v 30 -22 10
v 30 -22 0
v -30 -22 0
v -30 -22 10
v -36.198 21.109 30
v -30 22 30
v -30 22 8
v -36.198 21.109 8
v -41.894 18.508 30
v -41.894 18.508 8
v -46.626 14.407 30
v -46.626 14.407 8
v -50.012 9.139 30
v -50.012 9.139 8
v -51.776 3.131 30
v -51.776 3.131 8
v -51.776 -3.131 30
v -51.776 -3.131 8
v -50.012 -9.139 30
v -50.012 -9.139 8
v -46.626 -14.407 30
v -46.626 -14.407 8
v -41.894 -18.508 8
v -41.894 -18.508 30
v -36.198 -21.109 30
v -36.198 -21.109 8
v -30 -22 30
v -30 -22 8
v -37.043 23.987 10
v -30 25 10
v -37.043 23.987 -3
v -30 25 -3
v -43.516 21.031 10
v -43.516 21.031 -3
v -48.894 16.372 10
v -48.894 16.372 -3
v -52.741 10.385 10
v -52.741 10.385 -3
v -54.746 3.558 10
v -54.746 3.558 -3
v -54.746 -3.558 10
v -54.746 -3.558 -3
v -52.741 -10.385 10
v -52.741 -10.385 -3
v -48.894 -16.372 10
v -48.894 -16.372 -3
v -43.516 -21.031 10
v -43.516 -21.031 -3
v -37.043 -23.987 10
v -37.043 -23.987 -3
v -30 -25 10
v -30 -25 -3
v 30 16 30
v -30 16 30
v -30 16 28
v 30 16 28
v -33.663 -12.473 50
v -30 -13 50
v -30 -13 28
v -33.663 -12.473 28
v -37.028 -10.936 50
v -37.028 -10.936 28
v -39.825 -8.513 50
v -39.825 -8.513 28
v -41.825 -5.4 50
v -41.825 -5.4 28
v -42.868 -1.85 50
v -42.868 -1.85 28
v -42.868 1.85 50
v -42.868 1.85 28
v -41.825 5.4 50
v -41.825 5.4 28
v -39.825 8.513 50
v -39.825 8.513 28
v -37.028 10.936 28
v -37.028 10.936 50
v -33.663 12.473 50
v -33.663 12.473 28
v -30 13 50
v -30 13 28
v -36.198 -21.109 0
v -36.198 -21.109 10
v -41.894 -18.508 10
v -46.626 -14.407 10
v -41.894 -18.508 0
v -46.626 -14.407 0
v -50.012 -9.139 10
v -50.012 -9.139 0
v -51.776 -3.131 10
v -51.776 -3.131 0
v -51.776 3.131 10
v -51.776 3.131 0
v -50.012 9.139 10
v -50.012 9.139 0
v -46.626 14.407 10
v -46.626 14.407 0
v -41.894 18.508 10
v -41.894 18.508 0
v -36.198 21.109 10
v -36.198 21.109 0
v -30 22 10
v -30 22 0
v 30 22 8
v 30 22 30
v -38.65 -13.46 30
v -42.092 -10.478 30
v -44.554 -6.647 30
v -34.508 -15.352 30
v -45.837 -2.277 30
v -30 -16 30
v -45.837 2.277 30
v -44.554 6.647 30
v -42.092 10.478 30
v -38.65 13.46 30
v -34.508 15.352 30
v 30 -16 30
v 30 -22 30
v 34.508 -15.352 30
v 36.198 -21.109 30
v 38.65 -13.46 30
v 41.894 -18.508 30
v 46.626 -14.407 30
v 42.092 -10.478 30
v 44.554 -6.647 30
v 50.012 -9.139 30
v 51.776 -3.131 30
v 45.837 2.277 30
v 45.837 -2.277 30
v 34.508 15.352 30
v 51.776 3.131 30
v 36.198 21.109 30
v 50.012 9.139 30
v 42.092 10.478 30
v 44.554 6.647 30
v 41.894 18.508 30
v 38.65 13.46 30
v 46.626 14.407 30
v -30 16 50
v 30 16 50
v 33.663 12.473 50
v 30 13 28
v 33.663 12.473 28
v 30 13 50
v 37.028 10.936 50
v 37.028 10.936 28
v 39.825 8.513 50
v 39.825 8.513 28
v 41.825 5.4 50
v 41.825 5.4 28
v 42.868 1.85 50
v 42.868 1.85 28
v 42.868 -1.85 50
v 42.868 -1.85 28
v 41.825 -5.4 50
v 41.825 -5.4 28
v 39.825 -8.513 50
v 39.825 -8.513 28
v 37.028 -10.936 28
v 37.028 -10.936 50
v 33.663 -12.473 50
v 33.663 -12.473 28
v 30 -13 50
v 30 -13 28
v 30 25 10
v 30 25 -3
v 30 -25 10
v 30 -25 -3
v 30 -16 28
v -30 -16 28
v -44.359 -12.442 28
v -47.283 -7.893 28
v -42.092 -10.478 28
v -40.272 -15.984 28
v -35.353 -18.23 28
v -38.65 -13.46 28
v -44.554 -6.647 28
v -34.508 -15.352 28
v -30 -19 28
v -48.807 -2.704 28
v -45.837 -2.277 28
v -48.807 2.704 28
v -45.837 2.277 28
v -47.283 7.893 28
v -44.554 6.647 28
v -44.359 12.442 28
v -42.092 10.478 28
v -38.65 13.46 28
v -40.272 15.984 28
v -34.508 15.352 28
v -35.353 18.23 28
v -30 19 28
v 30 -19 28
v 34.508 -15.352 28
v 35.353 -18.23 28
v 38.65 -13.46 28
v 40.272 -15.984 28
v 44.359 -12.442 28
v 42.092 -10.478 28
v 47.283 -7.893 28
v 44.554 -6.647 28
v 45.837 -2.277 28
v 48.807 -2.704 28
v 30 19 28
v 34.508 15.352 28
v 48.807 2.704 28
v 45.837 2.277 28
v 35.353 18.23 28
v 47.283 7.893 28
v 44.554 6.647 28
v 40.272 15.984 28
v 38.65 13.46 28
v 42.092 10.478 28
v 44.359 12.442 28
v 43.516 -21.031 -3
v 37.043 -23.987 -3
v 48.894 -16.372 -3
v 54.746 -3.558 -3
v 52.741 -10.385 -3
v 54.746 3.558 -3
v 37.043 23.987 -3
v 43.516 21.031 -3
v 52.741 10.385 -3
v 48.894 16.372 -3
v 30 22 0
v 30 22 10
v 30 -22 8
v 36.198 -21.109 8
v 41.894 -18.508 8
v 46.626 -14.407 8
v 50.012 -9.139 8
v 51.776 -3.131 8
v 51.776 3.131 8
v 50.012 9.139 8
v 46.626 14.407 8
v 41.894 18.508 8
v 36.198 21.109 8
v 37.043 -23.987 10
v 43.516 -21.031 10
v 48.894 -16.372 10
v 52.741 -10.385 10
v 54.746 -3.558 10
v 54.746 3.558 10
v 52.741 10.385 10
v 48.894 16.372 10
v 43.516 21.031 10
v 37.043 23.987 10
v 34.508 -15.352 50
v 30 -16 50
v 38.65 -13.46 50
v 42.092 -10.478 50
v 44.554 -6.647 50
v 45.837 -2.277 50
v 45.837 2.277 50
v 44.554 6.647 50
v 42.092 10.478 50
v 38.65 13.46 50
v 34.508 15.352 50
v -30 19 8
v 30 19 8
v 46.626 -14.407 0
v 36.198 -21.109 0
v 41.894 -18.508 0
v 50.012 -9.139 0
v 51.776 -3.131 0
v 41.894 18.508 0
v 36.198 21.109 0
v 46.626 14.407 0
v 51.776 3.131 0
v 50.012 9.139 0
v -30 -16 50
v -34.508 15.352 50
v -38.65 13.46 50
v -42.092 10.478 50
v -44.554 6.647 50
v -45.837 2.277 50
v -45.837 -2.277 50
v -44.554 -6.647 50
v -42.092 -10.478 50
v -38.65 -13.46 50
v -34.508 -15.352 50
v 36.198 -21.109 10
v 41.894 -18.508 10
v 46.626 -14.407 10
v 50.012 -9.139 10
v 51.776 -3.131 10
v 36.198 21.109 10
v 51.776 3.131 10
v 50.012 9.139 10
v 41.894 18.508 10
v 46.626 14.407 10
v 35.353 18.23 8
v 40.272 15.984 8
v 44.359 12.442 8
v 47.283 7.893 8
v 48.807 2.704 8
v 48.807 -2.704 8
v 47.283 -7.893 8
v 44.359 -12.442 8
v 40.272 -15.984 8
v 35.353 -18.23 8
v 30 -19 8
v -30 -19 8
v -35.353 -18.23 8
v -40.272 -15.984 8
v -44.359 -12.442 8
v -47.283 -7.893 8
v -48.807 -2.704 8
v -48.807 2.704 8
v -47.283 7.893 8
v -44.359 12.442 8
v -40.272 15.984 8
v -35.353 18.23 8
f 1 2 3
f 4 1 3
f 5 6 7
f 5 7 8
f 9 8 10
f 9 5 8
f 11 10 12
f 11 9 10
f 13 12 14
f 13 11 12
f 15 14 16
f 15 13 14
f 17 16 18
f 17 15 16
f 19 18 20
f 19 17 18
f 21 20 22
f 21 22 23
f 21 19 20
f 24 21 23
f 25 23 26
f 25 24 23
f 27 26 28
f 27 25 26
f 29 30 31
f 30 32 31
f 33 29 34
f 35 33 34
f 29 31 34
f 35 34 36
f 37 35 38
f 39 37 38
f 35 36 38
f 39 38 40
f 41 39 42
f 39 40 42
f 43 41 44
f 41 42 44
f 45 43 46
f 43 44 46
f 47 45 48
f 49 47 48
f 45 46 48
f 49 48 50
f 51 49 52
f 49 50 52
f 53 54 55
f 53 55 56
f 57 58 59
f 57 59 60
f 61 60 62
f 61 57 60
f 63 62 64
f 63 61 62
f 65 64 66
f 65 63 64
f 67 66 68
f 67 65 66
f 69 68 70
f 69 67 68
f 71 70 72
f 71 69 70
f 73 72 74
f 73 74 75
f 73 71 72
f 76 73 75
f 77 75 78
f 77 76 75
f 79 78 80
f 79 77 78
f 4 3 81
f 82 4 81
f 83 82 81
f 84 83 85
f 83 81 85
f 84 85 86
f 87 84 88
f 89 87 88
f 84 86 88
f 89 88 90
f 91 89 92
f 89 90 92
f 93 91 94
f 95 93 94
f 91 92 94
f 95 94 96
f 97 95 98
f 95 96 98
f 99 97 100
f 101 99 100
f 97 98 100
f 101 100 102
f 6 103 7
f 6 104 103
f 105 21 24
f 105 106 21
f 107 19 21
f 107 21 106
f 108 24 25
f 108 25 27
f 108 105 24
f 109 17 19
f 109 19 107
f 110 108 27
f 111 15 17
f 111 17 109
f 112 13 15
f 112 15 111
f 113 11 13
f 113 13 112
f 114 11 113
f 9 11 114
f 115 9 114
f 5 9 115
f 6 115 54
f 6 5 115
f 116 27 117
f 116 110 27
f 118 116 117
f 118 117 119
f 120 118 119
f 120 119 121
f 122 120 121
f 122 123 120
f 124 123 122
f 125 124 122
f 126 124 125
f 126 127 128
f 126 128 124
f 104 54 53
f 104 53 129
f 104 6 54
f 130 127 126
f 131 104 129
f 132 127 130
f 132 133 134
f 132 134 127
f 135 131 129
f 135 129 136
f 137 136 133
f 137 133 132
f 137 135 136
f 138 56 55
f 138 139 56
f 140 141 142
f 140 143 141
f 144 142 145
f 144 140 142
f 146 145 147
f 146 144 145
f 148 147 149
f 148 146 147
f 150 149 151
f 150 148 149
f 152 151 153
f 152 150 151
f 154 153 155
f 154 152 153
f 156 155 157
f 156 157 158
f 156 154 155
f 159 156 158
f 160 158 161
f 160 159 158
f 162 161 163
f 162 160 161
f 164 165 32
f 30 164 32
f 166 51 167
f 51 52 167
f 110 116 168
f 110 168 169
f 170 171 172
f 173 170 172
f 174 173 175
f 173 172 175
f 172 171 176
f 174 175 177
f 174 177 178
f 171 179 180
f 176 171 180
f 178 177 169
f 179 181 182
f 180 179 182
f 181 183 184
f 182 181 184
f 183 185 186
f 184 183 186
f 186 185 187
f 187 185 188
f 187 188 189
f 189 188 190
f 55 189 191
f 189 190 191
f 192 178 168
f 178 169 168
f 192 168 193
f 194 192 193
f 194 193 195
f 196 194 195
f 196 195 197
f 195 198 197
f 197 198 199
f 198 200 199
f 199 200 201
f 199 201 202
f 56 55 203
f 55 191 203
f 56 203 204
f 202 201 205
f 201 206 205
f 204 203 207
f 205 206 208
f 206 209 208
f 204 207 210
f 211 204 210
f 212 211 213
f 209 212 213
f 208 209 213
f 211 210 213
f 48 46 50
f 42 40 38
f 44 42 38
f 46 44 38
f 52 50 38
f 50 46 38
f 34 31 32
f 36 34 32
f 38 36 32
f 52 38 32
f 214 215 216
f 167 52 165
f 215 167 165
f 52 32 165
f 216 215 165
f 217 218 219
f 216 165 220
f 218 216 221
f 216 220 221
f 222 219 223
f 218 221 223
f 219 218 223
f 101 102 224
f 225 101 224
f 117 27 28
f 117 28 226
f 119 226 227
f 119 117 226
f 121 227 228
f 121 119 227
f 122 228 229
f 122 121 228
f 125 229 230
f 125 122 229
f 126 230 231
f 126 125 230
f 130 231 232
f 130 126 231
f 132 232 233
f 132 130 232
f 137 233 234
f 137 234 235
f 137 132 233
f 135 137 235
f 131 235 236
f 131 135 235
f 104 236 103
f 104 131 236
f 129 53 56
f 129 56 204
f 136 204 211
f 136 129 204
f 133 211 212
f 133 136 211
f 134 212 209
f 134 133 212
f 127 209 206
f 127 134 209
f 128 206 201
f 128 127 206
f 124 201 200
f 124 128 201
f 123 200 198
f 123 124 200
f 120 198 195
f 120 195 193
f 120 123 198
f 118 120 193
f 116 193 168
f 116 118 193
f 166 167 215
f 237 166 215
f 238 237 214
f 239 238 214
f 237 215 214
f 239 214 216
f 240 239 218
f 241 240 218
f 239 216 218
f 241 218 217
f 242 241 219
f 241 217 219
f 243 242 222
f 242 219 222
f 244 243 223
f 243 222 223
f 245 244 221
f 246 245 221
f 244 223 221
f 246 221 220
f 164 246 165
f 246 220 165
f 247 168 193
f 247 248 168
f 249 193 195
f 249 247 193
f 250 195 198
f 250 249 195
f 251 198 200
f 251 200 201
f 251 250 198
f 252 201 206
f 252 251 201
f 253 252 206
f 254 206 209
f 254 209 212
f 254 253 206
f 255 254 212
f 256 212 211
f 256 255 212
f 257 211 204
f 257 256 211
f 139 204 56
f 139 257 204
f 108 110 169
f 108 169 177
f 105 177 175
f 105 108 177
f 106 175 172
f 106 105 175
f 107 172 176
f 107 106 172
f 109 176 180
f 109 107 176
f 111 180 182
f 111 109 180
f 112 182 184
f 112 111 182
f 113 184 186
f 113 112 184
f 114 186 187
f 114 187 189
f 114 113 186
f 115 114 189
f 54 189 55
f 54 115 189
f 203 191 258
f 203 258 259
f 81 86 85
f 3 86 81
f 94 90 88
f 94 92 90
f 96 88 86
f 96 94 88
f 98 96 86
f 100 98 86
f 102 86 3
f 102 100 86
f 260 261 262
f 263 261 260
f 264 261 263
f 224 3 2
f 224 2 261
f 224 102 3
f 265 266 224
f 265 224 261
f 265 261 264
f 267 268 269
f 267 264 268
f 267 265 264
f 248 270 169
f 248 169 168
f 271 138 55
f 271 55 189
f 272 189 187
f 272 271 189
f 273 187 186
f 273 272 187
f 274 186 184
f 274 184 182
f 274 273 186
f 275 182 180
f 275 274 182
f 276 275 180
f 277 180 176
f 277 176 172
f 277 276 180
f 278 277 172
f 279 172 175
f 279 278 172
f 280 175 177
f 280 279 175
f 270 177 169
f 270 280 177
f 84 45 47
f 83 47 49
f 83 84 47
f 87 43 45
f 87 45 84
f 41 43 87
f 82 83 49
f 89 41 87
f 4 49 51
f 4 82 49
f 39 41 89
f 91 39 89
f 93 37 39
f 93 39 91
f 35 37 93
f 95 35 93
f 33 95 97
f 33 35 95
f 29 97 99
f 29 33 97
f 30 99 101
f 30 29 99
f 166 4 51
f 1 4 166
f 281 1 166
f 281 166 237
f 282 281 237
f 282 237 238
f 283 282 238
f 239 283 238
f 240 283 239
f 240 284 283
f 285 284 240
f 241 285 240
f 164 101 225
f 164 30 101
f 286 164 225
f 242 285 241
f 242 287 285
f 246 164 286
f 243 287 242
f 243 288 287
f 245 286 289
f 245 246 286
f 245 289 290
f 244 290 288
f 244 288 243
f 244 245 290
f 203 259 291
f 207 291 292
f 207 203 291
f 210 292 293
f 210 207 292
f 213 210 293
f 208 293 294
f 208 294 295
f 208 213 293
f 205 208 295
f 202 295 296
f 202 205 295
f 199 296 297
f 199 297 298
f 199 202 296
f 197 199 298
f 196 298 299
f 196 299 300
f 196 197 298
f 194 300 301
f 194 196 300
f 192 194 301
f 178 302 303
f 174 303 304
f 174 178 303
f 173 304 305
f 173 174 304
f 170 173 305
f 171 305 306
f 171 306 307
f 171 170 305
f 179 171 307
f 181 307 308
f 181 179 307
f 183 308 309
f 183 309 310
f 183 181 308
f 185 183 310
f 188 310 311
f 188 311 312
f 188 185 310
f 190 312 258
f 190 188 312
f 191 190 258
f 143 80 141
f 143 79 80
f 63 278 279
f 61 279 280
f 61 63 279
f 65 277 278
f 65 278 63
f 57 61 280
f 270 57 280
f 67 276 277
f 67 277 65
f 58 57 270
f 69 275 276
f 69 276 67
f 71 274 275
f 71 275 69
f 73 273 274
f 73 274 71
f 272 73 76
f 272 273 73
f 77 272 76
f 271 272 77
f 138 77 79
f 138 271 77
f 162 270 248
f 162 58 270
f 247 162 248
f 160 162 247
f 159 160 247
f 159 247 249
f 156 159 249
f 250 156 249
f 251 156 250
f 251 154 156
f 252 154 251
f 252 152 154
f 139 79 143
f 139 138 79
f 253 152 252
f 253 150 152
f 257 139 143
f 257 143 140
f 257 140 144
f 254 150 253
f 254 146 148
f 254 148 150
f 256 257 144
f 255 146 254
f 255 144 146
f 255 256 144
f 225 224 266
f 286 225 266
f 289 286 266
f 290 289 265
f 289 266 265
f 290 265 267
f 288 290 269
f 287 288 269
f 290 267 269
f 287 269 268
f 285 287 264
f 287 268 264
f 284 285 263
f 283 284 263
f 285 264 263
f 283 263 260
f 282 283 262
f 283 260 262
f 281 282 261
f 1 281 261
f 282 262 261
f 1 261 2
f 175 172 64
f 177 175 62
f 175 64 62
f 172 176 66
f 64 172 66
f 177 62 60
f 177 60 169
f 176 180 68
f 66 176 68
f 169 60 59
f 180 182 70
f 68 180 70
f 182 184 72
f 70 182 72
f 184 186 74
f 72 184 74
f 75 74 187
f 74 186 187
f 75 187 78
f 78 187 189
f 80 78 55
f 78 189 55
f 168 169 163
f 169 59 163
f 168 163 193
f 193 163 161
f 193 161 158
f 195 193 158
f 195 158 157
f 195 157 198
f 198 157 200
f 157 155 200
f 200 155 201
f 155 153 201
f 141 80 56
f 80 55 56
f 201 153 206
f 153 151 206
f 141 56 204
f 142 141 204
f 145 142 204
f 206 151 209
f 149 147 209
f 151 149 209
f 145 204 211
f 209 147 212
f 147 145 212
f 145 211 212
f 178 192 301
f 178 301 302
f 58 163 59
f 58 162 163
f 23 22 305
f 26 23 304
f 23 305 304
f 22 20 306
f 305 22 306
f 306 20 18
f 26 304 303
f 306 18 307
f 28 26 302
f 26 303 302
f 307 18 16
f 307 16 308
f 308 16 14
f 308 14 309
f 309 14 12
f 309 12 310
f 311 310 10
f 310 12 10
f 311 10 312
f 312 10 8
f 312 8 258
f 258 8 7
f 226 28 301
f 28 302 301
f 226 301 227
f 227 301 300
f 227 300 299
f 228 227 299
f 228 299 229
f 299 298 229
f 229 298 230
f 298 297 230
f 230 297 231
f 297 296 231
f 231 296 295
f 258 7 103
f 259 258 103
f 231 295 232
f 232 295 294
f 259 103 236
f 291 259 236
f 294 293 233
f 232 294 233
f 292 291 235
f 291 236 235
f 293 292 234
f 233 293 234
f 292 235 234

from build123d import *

# Parameters (mm, degrees)
F1_DEPTH      = 3
F2_DEPTH      = 10
F4_DEPTH      = 20
F4_DEPTH_BACK = 2
F6_DEPTH      = 20
F6_DEPTH_BACK = 2
F7_DEPTH      = 2


with BuildPart() as f1:
    # F0 (on Top) → F1 (new body)
    with BuildSketch(Plane.XY):
        with BuildLine():
            Line((30, 25), (-30, 25))
            ThreePointArc((-30, 25), (-55, 0), (-30, -25))
            Line((-30, -25), (30, -25))
            ThreePointArc((30, -25), (55, 0), (30, 25))
        make_face()
        with BuildLine():
            ThreePointArc((-30, -22.0000010729), (-52.0000010729, 0), (-30, 22.0000010729))
            Line((-30, 22.0000010729), (30, 22.0000010729))
            ThreePointArc((30, 22.0000010729), (52.0000010729, 0), (30, -22.0000010729))
            Line((30, -22.0000010729), (-30, -22.0000010729))
        make_face(mode=Mode.SUBTRACT)
        with BuildLine():
            Line((30, 22.0000010729), (-30, 22.0000010729))
            ThreePointArc((-30, 22.0000010729), (-52.0000010729, 0), (-30, -22.0000010729))
            Line((-30, -22.0000010729), (30, -22.0000010729))
            ThreePointArc((30, -22.0000010729), (52.0000010729, 0), (30, 22.0000010729))
        make_face()
    extrude(amount=-F1_DEPTH)

    # F0 (on Top) → F2 (join)
    with BuildSketch(Plane.XY):
        with BuildLine():
            Line((30, 25), (-30, 25))
            ThreePointArc((-30, 25), (-55, 0), (-30, -25))
            Line((-30, -25), (30, -25))
            ThreePointArc((30, -25), (55, 0), (30, 25))
        make_face()
        with BuildLine():
            ThreePointArc((-30, -22.0000010729), (-52.0000010729, 0), (-30, 22.0000010729))
            Line((-30, 22.0000010729), (30, 22.0000010729))
            ThreePointArc((30, 22.0000010729), (52.0000010729, 0), (30, -22.0000010729))
            Line((30, -22.0000010729), (-30, -22.0000010729))
        make_face(mode=Mode.SUBTRACT)
    extrude(amount=F2_DEPTH)


with BuildPart() as f4:
    # F3 (on face) → F4 (new body, two sides)
    with BuildSketch(Plane.XY.offset(10)) as f4_sk:
        with BuildLine():
            Line((30, 22.0000010729), (-30, 22.0000010729))
            ThreePointArc((-30, 22.0000010729), (-52.0000010729, 0), (-30, -22.0000010729))
            Line((-30, -22.0000010729), (30, -22.0000010729))
            ThreePointArc((30, -22.0000010729), (52.0000010729, 0), (30, 22.0000010729))
        make_face()
        with BuildLine():
            ThreePointArc((-30, -19.0000024438), (-49.0000024438, 0), (-30, 19.0000024438))
            Line((-30, 19.0000024438), (30, 19.0000024438))
            ThreePointArc((30, 19.0000024438), (49.0000024438, 0), (30, -19.0000024438))
            Line((30, -19.0000024438), (-30, -19.0000024438))
        make_face(mode=Mode.SUBTRACT)
    extrude(amount=F4_DEPTH)
    extrude(f4_sk.sketch, amount=-F4_DEPTH_BACK)

    # F5 (on face) → F7 (join)
    with BuildSketch(Plane.XY.offset(30)):
        with BuildLine():
            Line((30, 19.0000024438), (-30, 19.0000024438))
            ThreePointArc((-30, 19.0000024438), (-49.0000024438, 0), (-30, -19.0000024438))
            Line((-30, -19.0000024438), (30, -19.0000024438))
            ThreePointArc((30, -19.0000024438), (49.0000024438, 0), (30, 19.0000024438))
        make_face()
        with BuildLine():
            ThreePointArc((-30, -16.0000026226), (-46.0000026226, 0), (-30, 16.0000026226))
            Line((-30, 16.0000026226), (30, 16.0000026226))
            ThreePointArc((30, 16.0000026226), (46.0000026226, 0), (30, -16.0000026226))
            Line((30, -16.0000026226), (-30, -16.0000026226))
        make_face(mode=Mode.SUBTRACT)
    extrude(amount=-F7_DEPTH)


with BuildPart() as f6:
    # F5 (on face) → F6 (new body, two sides)
    with BuildSketch(Plane.XY.offset(30)) as f6_sk:
        with BuildLine():
            Line((30, 16.0000026226), (-30, 16.0000026226))
            ThreePointArc((-30, 16.0000026226), (-46.0000026226, 0), (-30, -16.0000026226))
            Line((-30, -16.0000026226), (30, -16.0000026226))
            ThreePointArc((30, -16.0000026226), (46.0000026226, 0), (30, 16.0000026226))
        make_face()
        with BuildLine():
            ThreePointArc((-30, -13.0000026226), (-43.0000026226, 0), (-30, 13.0000026226))
            Line((-30, 13.0000026226), (30, 13.0000026226))
            ThreePointArc((30, 13.0000026226), (43.0000026226, 0), (30, -13.0000026226))
            Line((30, -13.0000026226), (-30, -13.0000026226))
        make_face(mode=Mode.SUBTRACT)
    extrude(amount=F6_DEPTH)
    extrude(f6_sk.sketch, amount=-F6_DEPTH_BACK)


solid = Compound([f1.part, f4.part, f6.part])
